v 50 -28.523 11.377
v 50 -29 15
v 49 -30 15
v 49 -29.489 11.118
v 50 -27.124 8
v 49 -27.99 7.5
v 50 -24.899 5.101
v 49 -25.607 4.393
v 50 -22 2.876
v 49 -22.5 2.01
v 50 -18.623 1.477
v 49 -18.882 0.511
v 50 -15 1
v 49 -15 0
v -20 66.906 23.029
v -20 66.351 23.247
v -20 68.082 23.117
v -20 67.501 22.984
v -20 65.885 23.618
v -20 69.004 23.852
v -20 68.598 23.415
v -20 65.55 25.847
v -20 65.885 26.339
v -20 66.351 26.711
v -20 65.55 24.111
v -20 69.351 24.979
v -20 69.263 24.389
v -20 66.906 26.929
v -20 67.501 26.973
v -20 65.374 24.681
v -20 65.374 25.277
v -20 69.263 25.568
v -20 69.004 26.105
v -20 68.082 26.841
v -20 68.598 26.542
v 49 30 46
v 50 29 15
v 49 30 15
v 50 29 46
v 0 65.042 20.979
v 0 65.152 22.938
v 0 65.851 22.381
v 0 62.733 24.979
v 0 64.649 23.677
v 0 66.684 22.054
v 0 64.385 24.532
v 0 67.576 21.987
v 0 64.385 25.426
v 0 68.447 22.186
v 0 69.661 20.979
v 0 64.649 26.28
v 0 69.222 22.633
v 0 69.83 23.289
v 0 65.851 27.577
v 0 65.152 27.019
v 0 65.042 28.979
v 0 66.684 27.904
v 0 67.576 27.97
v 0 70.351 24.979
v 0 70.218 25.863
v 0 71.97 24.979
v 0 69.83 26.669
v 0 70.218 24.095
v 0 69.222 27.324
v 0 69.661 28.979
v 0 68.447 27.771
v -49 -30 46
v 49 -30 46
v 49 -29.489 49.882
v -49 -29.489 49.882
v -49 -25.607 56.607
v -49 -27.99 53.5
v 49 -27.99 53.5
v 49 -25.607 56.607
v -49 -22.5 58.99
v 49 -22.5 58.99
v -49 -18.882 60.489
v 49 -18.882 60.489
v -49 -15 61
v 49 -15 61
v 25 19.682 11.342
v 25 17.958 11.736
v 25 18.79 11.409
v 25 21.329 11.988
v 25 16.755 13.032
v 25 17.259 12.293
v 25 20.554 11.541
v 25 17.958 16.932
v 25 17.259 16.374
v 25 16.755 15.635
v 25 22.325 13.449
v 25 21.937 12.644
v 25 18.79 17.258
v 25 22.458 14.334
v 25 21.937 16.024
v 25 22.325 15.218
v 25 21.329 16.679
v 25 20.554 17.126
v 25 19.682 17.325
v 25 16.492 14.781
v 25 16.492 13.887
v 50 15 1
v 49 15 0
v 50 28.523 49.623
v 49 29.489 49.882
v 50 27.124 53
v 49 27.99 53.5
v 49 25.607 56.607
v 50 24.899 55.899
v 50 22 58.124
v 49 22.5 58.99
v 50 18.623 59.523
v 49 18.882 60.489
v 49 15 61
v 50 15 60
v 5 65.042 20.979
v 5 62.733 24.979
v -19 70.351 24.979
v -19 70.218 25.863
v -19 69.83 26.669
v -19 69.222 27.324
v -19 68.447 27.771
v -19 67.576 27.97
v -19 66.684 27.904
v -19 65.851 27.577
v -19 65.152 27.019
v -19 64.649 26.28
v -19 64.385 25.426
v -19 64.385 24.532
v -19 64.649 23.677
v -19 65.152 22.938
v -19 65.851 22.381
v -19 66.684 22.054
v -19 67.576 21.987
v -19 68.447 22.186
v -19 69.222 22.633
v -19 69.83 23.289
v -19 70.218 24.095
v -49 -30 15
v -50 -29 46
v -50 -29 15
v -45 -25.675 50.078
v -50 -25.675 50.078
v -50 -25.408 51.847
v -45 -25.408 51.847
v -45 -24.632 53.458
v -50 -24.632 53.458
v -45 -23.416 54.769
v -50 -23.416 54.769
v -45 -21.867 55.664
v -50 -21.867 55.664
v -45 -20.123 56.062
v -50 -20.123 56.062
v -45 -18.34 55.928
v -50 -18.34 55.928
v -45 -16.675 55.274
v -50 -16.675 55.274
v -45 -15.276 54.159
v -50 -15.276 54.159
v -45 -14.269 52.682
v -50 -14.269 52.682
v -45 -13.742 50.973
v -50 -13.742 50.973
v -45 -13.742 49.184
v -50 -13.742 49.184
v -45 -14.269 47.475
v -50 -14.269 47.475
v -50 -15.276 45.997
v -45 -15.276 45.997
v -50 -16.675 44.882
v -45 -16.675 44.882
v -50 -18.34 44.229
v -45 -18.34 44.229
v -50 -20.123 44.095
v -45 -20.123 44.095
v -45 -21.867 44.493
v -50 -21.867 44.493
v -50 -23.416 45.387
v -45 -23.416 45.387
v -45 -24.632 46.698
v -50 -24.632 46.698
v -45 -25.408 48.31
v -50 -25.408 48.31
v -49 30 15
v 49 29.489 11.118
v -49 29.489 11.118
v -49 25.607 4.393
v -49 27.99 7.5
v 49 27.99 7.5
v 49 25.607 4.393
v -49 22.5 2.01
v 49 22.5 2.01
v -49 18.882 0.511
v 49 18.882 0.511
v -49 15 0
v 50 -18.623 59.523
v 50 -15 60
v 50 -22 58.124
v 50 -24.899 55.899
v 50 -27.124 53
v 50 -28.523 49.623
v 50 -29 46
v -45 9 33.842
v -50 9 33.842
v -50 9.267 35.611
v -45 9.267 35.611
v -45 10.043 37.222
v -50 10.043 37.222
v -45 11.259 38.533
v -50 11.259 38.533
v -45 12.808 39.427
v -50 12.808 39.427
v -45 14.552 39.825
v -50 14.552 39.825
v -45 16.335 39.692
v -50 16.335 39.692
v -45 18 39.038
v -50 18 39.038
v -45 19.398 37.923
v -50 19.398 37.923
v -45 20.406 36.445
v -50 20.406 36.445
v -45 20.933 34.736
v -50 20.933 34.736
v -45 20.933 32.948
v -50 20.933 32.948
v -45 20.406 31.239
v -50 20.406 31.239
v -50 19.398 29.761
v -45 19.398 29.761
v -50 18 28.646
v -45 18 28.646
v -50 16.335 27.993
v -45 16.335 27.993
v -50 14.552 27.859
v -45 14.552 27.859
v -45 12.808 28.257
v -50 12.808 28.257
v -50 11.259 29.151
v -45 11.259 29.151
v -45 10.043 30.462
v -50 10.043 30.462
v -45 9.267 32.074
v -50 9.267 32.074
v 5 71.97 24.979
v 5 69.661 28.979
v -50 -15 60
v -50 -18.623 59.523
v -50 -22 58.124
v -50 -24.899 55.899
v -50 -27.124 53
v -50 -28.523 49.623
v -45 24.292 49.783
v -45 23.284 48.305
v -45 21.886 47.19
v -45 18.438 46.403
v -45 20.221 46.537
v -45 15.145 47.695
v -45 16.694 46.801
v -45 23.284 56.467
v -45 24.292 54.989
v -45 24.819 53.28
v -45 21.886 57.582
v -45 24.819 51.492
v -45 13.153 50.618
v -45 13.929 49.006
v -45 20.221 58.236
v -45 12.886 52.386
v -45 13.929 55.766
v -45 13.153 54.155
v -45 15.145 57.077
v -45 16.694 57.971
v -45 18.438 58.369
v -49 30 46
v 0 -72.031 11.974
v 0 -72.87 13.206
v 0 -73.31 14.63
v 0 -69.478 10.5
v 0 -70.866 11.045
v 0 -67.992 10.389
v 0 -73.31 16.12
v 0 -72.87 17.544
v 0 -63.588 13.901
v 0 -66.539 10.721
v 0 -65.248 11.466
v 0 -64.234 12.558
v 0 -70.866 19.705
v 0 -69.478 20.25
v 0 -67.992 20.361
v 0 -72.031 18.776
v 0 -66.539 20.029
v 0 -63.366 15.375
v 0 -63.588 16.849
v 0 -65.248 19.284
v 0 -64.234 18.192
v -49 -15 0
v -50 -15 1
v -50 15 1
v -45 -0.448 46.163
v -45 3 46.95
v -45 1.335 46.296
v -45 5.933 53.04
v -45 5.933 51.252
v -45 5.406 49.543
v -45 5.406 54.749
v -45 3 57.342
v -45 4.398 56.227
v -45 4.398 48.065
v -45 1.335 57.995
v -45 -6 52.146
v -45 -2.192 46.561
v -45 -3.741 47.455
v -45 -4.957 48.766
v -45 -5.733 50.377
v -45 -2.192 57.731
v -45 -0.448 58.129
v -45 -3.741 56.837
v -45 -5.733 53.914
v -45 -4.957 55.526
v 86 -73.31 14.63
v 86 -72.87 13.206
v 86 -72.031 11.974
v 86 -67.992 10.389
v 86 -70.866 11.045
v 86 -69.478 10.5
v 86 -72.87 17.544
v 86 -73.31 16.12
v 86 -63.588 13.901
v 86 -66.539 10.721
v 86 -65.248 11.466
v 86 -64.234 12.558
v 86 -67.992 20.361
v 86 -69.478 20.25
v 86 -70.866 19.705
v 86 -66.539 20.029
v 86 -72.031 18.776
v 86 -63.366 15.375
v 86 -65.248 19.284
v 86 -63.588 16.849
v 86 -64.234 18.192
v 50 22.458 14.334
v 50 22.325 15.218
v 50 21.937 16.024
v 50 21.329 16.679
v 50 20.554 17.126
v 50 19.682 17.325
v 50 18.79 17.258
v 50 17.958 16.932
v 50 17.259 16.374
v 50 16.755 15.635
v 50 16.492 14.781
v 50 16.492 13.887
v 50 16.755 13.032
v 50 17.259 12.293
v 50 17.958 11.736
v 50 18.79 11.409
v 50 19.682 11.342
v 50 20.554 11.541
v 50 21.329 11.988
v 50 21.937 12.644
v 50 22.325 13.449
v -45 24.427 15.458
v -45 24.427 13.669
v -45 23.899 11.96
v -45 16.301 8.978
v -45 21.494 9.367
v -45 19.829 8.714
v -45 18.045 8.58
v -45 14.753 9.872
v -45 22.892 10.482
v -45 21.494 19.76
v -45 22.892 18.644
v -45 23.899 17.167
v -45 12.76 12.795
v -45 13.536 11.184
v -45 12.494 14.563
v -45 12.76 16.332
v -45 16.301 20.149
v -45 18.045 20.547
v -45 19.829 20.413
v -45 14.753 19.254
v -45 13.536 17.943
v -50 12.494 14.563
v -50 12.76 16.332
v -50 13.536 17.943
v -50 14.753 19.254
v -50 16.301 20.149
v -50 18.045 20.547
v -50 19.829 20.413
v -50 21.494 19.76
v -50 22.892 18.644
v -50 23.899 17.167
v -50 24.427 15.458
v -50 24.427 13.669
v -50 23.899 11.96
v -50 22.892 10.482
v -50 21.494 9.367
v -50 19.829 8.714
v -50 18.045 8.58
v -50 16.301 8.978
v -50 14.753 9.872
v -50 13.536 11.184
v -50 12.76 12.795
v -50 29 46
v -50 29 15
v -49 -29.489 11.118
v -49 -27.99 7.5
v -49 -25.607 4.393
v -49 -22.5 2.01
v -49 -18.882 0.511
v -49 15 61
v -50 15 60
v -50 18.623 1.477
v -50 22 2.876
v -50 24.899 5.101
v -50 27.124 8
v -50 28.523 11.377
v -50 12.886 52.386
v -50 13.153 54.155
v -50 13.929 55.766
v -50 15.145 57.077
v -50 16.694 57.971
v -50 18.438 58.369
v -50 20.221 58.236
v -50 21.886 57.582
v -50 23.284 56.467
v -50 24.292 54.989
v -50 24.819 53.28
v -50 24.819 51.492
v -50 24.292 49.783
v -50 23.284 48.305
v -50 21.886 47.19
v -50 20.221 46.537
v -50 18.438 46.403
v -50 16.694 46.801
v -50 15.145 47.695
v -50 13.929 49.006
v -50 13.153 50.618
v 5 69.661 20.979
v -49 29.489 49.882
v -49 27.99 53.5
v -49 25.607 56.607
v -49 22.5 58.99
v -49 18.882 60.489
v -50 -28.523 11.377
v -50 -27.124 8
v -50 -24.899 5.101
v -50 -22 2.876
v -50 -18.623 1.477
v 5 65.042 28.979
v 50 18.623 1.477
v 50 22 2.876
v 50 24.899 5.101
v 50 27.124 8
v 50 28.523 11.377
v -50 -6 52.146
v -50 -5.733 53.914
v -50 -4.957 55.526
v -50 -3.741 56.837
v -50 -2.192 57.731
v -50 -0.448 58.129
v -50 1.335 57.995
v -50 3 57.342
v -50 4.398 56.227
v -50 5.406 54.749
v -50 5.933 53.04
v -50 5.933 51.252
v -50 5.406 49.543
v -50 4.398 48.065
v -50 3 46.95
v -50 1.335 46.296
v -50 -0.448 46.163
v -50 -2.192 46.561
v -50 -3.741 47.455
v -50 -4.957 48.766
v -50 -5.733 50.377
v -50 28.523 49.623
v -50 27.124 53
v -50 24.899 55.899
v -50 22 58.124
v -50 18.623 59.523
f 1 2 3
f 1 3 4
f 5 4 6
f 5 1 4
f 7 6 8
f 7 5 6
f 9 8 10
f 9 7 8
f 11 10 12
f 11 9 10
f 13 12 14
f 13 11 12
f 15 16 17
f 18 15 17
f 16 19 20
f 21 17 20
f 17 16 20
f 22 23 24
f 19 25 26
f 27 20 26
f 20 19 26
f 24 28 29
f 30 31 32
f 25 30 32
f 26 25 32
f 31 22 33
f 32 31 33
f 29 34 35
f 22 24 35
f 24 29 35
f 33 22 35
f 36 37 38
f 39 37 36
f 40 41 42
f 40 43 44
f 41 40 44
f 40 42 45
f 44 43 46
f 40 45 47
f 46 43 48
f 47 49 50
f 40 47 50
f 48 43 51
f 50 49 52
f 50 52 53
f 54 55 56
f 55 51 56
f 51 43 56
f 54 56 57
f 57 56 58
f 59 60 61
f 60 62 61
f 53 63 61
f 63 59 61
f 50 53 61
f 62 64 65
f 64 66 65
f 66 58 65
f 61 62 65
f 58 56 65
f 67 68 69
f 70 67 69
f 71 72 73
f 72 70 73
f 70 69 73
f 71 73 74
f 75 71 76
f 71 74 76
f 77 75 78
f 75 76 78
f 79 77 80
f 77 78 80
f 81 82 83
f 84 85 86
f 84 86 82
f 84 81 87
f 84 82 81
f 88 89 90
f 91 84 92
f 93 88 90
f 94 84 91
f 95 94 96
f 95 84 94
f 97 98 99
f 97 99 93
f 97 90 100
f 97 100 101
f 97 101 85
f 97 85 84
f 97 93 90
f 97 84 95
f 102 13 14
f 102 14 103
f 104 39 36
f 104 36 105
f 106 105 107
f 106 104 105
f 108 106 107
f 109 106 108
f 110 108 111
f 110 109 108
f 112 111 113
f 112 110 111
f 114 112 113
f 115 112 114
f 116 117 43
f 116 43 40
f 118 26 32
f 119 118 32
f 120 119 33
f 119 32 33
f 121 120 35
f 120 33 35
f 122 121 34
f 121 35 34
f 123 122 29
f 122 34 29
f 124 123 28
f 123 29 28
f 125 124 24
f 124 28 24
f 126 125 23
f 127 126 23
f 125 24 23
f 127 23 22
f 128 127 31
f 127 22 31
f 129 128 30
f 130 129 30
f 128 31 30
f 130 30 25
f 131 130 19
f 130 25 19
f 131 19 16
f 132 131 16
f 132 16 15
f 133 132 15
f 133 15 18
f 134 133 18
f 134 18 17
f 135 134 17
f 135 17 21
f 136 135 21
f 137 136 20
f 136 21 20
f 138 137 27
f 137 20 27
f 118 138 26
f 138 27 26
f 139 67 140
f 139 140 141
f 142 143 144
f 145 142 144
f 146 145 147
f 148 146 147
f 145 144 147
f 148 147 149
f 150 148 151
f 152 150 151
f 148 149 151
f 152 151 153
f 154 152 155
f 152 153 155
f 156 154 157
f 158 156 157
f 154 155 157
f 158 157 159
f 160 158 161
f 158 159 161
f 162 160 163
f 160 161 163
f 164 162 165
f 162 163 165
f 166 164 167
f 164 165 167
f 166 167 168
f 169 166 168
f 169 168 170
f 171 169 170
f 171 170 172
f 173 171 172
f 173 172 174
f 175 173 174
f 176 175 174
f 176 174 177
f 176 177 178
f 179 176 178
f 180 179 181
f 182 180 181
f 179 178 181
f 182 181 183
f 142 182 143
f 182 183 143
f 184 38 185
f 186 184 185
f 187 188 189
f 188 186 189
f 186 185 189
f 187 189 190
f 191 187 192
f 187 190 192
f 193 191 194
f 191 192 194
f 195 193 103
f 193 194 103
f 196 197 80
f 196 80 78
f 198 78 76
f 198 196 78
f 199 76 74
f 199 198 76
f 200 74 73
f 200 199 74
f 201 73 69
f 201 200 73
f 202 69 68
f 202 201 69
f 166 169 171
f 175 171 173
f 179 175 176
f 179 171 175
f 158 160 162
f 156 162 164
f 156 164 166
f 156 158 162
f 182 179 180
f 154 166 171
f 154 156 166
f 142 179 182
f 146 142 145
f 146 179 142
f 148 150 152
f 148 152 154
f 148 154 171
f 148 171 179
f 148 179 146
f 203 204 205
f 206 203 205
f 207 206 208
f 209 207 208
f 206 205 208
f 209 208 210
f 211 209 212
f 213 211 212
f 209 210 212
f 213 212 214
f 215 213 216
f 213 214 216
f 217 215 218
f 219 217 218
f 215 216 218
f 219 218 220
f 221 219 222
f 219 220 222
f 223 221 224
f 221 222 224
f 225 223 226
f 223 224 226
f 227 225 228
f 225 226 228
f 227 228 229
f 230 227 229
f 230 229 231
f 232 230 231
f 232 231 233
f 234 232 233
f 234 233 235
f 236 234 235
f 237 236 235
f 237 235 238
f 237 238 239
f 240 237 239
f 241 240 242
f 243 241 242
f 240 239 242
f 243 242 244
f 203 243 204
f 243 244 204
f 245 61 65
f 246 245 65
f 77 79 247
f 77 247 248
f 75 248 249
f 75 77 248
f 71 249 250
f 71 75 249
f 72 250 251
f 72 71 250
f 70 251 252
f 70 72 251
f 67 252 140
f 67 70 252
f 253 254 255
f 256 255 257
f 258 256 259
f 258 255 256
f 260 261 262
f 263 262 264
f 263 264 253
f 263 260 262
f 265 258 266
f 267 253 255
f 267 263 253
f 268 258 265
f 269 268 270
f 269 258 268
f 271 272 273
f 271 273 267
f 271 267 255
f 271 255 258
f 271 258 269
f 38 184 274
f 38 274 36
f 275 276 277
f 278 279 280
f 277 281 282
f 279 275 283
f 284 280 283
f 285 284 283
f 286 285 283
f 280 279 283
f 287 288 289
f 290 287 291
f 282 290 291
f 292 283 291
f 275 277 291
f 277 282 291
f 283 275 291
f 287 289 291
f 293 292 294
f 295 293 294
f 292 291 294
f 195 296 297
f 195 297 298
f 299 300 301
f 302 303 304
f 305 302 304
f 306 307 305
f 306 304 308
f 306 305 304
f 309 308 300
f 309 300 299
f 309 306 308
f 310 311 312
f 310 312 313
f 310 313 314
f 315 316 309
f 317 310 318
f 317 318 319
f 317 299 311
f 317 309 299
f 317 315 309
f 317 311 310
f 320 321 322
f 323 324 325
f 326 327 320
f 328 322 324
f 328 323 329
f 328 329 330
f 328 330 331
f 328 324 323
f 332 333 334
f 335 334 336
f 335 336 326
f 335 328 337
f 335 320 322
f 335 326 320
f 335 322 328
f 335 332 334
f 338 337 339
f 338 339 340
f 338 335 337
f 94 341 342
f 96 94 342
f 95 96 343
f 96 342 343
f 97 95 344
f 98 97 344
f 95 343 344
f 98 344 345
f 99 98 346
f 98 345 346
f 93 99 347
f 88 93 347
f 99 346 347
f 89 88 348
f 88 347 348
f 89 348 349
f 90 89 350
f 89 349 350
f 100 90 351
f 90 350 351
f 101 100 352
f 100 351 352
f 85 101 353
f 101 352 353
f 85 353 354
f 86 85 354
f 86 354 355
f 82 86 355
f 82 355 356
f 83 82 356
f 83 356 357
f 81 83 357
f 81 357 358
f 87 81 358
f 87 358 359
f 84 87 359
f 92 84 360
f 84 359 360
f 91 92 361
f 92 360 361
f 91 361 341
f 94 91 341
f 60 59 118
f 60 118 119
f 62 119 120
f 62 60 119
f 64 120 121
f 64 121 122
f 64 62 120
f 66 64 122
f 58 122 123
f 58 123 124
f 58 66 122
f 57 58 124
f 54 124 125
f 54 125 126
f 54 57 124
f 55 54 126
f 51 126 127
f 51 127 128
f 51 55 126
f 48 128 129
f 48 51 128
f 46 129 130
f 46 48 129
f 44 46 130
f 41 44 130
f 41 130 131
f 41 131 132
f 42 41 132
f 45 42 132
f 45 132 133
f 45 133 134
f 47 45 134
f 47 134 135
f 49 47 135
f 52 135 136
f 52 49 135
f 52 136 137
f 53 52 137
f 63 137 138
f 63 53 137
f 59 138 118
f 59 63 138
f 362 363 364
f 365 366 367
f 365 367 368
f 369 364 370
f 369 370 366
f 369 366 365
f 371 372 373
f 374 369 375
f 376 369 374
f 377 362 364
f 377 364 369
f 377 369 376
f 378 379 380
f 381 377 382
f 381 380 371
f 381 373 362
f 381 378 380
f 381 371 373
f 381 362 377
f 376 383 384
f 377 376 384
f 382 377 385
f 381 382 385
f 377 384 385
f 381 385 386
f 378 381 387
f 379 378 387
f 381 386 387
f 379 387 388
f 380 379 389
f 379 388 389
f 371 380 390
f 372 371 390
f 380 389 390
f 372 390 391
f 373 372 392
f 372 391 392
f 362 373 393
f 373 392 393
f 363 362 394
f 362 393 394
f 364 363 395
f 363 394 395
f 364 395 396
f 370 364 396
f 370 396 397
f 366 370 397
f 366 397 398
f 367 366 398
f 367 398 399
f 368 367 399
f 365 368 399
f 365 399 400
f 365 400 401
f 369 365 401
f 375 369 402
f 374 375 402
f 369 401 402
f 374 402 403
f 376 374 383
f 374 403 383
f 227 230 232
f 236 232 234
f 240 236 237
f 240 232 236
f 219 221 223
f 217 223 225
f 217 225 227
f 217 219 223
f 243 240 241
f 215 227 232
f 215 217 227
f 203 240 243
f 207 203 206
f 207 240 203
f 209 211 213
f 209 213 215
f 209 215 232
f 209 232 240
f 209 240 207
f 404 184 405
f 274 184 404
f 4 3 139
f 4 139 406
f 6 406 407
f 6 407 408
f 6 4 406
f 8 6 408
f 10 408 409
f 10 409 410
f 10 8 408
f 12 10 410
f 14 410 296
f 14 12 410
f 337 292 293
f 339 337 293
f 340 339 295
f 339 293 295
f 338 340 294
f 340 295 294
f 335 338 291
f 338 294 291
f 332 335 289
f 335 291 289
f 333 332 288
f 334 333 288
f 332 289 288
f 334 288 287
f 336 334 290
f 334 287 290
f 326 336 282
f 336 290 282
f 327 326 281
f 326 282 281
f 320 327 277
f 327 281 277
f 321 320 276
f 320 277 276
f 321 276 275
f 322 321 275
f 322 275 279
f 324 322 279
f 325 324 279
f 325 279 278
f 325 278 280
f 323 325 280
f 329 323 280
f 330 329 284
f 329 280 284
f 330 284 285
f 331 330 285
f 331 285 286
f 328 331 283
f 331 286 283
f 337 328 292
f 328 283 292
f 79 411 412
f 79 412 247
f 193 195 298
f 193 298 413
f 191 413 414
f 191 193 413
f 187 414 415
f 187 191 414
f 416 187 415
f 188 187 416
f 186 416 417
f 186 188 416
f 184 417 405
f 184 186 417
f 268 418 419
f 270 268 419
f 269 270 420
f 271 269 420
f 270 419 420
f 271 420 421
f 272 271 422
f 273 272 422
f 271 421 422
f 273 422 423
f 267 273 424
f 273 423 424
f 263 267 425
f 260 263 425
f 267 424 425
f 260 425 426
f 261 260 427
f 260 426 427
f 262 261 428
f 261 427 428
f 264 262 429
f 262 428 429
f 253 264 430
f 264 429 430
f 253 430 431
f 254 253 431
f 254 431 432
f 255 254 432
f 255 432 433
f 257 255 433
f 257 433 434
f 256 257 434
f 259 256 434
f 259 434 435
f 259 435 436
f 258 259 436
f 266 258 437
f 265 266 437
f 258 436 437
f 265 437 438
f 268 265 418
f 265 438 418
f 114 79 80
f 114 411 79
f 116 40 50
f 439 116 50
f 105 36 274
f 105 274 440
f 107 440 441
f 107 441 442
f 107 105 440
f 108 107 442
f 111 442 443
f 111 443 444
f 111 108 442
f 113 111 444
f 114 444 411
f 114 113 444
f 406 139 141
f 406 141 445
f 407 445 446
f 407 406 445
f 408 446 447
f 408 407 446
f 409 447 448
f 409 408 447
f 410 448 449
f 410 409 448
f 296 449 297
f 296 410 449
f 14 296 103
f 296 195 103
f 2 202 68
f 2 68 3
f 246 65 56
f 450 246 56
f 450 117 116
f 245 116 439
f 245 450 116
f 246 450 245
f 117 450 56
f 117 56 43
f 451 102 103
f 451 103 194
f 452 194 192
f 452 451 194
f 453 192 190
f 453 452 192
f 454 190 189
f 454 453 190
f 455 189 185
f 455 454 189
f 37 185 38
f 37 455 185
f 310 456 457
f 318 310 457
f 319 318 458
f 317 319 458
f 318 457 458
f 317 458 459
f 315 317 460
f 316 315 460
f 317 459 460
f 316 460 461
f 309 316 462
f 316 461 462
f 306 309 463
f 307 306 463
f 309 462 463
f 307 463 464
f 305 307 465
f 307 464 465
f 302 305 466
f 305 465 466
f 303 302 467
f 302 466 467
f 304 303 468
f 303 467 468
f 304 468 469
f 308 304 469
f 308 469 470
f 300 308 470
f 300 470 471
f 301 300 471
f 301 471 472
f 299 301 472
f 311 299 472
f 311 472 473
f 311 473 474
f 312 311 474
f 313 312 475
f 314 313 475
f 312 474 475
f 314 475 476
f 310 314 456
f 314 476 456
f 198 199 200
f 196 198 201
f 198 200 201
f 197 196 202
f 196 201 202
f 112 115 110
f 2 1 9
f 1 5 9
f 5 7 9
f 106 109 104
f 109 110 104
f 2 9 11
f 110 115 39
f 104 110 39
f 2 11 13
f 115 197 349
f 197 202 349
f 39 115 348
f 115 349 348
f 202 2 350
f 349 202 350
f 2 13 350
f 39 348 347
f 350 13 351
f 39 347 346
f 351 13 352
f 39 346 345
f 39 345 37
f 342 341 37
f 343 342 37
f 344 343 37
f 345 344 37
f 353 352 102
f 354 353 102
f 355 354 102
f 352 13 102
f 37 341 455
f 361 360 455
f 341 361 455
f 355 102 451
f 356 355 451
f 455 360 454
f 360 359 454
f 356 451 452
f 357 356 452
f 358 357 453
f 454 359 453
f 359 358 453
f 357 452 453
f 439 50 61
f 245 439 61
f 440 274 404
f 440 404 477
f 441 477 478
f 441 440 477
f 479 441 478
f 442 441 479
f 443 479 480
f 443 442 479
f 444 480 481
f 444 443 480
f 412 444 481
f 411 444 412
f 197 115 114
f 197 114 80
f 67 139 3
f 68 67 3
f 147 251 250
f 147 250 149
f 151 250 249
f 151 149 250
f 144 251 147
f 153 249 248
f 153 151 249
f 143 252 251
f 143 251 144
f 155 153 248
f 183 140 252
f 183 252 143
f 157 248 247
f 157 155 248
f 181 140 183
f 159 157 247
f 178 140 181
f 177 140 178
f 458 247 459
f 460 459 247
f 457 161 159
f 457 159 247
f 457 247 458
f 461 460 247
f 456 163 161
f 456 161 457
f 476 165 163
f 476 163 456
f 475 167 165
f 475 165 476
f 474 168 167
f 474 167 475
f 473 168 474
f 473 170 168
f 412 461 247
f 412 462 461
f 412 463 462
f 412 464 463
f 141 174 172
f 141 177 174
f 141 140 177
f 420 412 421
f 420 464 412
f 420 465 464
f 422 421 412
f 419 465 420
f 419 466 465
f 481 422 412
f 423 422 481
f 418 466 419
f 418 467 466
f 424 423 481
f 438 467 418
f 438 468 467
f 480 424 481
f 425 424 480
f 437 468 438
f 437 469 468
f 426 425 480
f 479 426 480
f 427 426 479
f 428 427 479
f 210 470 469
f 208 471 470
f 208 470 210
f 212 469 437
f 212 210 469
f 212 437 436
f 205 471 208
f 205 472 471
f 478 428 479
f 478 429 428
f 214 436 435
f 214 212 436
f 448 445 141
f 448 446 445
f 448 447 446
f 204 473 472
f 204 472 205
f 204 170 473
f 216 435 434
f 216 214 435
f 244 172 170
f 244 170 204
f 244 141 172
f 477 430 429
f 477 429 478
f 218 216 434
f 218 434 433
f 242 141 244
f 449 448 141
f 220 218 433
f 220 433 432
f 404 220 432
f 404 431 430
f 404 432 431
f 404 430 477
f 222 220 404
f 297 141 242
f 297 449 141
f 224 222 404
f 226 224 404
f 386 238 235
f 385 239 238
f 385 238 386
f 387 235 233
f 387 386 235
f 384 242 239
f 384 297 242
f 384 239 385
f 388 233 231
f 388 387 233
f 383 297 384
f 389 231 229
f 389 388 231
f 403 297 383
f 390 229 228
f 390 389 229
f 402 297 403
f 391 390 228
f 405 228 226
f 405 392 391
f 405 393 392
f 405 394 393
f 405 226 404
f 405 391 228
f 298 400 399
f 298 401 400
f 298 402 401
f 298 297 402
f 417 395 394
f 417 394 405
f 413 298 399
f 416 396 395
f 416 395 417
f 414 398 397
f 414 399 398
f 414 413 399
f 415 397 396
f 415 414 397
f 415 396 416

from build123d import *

# Parameters (mm, degrees)
F0_W       = 100
F0_H       = 60
F1_DEPTH   = 61
F2_R       = 15
F3_R       = 5
F4_DEPTH   = 86
F5_R       = 6
F6_DEPTH   = 5
F7_R       = 3
F8_DEPTH   = 25
F9_R       = 3
F10_DEPTH  = 20
F12_DEPTH  = 5
F13_SIZE   = 1
F13_2_SIZE = 1


with BuildPart() as f1:
    # F0 (on Top) → F1 (new body)
    with BuildSketch(Plane.XY):
        Rectangle(F0_W, F0_H)
    extrude(amount=F1_DEPTH)

    # F2
    f2_edges = [f1.edges().sort_by_distance(p)[0] for p in [
        (0, -30, 61),
        (0, 30, 61),
        (0, -30, 0),
        (0, 30, 0),
    ]]
    fillet(f2_edges, radius=F2_R)

    # F5 (on face) → F6 (cut)
    with BuildSketch(Plane(origin=(-50, 0, 0), x_dir=(0, -1, 0), z_dir=(-1, 0, 0))):
        with Locations((-18.8861116767, 52.3861013353)):
            Circle(F5_R)
        with Locations((-15, 33.8421463966)):
            Circle(F5_R)
        with Locations((19.6746885777, 50.0783026218)):
            Circle(F5_R)
        with Locations((0, 52.145909518)):
            Circle(F5_R)
        with Locations((-18.4935294092, 14.5634403452)):
            Circle(F5_R)
    extrude(amount=-F6_DEPTH, mode=Mode.SUBTRACT)

    # F7 (on face) → F8 (cut)
    with BuildSketch(Plane.YZ.offset(50)):
        with Locations((19.458046183, 14.3336672336)):
            Circle(F7_R)
    extrude(amount=-F8_DEPTH, mode=Mode.SUBTRACT)

    # F13#2
    f13_2_edges = [f1.edges().sort_by_distance(p)[0] for p in [
        (50, 25.606602, 56.606602),
        (0, 30, 46),
        (0, 15, 61),
        (-50, 25.606602, 56.606602),
    ]]
    chamfer(f13_2_edges, length=F13_2_SIZE)


with BuildPart() as f4:
    # F3 (on Right) → F4 (new body)
    with BuildSketch(Plane.YZ):
        with Locations((-68.3655515313, 15.3749547899)):
            Circle(F3_R)
    extrude(amount=F4_DEPTH)


with BuildPart() as f10:
    # F9 (on Right) → F10 (new body)
    with BuildSketch(Plane.YZ):
        with Locations((67.351475358, 24.9788053334)):
            Circle(F9_R)
    extrude(amount=-F10_DEPTH)

    # F11 (on face) → F12 (join)
    with BuildSketch(Plane.YZ):
        Polygon((69.6608764348, 20.9788053334), (71.9702775115, 24.9788053334), (69.6608764348, 28.9788053334), (65.0420742813, 28.9788053334), (62.7326732045, 24.9788053334), (65.0420742813, 20.9788053334), align=None)
    extrude(amount=F12_DEPTH)

    # F13
    f13_edges = [f10.edges().sort_by_distance(p)[0] for p in [
        (-20, 64.351475, 24.978805),
    ]]
    chamfer(f13_edges, length=F13_SIZE)


solid = Compound([f1.part, f4.part, f10.part])
